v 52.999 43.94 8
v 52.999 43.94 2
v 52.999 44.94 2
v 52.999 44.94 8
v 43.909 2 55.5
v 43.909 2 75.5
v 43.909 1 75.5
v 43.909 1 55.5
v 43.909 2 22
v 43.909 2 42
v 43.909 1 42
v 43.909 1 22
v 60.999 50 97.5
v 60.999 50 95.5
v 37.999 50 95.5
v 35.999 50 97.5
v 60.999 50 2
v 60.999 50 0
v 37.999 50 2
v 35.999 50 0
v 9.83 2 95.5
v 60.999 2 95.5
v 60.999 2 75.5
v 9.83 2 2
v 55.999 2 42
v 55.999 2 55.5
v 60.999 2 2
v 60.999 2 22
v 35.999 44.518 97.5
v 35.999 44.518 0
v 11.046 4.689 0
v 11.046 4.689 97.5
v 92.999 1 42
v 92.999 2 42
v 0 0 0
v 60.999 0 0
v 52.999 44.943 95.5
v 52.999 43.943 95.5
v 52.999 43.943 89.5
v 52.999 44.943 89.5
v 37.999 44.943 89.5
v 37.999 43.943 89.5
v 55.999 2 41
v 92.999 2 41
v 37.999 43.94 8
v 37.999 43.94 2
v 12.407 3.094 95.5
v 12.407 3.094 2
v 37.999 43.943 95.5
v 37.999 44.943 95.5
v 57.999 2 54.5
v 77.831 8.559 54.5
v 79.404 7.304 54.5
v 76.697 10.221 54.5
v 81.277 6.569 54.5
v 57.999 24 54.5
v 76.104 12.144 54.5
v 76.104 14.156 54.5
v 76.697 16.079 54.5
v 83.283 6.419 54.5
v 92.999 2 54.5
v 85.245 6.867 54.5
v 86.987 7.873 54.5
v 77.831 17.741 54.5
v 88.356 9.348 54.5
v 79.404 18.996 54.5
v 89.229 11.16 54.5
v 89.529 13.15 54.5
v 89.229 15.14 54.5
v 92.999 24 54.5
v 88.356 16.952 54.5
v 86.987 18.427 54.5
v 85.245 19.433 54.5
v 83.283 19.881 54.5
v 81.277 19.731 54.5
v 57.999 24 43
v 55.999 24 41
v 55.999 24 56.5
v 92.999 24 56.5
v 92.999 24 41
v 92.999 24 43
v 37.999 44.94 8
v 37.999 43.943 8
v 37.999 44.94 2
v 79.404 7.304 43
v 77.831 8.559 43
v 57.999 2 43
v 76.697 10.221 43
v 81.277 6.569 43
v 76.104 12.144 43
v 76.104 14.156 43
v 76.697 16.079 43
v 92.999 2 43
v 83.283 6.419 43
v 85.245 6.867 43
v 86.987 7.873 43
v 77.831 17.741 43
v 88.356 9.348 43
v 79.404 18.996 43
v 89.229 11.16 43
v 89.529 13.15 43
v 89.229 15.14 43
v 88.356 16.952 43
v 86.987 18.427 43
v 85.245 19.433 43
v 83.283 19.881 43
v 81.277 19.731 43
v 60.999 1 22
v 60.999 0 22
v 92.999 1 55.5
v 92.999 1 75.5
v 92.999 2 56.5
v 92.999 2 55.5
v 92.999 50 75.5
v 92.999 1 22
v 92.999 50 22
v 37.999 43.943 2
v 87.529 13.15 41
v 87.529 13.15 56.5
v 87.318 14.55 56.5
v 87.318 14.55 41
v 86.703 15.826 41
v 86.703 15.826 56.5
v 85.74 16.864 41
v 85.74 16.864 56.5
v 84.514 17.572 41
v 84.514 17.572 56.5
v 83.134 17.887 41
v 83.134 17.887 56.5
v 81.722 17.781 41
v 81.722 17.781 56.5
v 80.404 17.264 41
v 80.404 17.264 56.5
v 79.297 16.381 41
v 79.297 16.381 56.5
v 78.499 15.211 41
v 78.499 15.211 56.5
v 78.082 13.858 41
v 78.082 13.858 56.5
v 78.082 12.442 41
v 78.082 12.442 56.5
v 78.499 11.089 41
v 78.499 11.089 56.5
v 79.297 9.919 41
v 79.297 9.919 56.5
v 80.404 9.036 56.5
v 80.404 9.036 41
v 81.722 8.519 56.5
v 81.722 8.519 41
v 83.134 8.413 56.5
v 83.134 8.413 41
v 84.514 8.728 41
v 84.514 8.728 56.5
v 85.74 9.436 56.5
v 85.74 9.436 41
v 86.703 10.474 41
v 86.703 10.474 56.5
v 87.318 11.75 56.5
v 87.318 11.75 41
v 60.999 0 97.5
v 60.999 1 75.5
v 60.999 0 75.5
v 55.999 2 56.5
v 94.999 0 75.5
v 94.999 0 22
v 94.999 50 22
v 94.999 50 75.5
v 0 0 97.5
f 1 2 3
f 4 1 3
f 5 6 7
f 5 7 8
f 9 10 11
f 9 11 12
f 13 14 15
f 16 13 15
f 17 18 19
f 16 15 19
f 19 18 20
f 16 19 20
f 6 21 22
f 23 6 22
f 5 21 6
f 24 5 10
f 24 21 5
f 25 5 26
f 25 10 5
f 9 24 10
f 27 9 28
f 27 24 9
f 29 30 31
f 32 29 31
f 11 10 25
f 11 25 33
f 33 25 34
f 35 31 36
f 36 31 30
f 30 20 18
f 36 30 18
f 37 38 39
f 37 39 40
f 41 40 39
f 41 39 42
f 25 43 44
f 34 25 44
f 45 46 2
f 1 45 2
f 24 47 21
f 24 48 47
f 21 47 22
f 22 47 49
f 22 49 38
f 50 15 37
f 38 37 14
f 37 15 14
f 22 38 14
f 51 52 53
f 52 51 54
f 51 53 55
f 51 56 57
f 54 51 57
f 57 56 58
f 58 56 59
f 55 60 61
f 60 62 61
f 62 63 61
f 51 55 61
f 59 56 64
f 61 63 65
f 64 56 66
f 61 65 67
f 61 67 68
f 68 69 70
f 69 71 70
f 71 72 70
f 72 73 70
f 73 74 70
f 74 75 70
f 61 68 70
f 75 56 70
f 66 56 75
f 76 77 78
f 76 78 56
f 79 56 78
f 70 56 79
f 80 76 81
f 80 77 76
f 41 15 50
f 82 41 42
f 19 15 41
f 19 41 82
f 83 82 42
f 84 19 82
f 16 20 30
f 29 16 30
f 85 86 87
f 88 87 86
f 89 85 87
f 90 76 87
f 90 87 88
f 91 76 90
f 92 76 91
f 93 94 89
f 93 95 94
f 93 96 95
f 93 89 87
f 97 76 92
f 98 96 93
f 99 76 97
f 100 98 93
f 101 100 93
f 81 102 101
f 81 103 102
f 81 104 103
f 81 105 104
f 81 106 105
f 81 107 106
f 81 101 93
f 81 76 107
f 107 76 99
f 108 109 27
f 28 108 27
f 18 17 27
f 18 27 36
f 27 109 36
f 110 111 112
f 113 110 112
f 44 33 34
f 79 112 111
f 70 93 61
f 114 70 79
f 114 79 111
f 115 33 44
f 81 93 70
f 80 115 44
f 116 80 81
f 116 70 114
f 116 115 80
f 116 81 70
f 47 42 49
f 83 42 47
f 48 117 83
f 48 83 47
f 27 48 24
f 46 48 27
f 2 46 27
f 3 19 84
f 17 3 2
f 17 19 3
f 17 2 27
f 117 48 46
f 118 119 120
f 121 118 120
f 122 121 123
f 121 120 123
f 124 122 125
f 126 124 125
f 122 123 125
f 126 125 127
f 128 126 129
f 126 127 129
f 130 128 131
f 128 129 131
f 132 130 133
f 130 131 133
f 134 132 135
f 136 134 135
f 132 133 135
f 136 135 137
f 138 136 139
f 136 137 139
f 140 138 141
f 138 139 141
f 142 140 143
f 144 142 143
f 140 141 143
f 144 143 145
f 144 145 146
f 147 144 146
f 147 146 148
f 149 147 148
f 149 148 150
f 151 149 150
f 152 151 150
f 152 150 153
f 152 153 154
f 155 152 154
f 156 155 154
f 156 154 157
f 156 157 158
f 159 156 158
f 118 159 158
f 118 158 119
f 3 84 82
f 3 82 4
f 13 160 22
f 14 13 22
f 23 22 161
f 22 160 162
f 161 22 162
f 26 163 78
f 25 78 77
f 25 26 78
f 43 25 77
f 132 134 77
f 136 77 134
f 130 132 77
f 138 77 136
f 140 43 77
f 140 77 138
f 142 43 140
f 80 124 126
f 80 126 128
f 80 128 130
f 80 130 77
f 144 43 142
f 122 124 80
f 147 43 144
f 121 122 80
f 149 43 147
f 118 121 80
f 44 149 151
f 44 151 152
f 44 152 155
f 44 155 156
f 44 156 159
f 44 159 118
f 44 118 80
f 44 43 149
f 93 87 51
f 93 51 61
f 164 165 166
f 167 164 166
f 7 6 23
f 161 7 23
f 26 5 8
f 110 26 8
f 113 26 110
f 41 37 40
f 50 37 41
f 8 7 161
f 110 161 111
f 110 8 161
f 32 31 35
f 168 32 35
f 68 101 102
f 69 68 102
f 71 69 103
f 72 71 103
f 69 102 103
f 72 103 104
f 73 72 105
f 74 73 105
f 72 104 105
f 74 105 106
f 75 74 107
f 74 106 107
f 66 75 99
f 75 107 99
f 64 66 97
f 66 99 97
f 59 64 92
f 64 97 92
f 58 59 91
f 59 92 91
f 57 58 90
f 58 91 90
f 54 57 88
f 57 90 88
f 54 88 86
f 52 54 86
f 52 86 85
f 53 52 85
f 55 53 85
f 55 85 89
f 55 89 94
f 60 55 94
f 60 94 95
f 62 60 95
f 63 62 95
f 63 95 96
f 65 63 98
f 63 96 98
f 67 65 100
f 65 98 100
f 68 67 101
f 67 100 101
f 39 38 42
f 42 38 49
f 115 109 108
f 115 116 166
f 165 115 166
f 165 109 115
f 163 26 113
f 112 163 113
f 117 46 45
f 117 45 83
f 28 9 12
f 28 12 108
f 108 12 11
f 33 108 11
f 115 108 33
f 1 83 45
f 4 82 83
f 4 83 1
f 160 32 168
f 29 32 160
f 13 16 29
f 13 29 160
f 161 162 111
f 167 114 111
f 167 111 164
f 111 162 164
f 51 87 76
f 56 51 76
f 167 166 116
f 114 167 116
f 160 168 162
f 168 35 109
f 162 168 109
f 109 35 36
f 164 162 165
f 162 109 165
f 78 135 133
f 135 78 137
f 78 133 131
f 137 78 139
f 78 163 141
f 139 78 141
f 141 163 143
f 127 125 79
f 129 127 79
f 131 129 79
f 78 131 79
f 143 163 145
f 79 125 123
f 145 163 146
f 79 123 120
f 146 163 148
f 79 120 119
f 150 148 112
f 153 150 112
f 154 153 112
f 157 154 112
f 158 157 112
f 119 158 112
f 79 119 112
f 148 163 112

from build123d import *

# Parameters (mm, degrees)
SALIENTE_EXTRUIR1_DEPTH    = 97.5
VACIADO1_T                 = -2
CORTAR_EXTRUIR1_DEPTH      = 146.020714686
CORTAR_EXTRUIR1_DEPTH_BACK = 146.020714686
CROQUIS2_W                 = 34
CROQUIS2_H                 = 22
CROQUIS5_W                 = 37
CROQUIS5_H                 = 15.5
SALIENTE_EXTRUIR3_DEPTH    = 22
CROQUIS7_R                 = 4.75
CORTAR_EXTRUIR2_DEPTH      = 22
VACIADO2_START             = 43
VACIADO2_OUTLINE_W         = 35
VACIADO2_OUTLINE_H         = 22
VACIADO2_OUTLINE_R         = 6.75
VACIADO2_DEPTH             = 11.5
CROQUIS9_W                 = 49.09
CROQUIS9_H                 = 20
CORTAR_EXTRUIR3_DEPTH      = 1
CROQUIS11_W                = 15
CROQUIS11_H                = 1
SALIENTE_EXTRUIR7_DEPTH    = 6
CROQUIS15_W                = 15
CROQUIS15_H                = 1
SALIENTE_EXTRUIR8_DEPTH    = 6


# Read off the part's stored shape, not the designer's step: Vaciado2
with BuildPart() as part:
    # Croquis1 → Saliente-Extruir1 (new body)
    with BuildSketch(Plane.XY):
        Polygon((0, 0), (94.998724665, 0), (94.998724665, 50), (35.998724665, 50), (35.998724665, 44.517964324), (11.046058241, 4.688773542), align=None)
    extrude(amount=SALIENTE_EXTRUIR1_DEPTH)

    # Vaciado1
    vaciado1_openings = [part.faces().sort_by_distance(p)[0] for p in [
        (65.498724665, 50, 48.75),
    ]]
    offset(amount=VACIADO1_T, openings=vaciado1_openings, kind=Kind.INTERSECTION)

    # Croquis2 → Cortar-Extruir1 (cut, two sides: drawn at the far end of the back side and taken through both)
    with BuildSketch(Plane(origin=(0, 50, 0), x_dir=(1, 0, 0), z_dir=(0, 1, 0)).offset(-CORTAR_EXTRUIR1_DEPTH_BACK)):
        with Locations((77.998724665, -11)):
            Rectangle(CROQUIS2_W, CROQUIS2_H)
        with Locations((77.998724665, -86.5)):
            Rectangle(CROQUIS2_W, CROQUIS2_H)
    extrude(amount=CORTAR_EXTRUIR1_DEPTH + CORTAR_EXTRUIR1_DEPTH_BACK, mode=Mode.SUBTRACT)

    # Croquis5 → Saliente-Extruir3 (add)
    with BuildSketch(Plane(origin=(0, 2, 0), x_dir=(1, 0, 0), z_dir=(0, 1, 0))):
        with Locations((74.498724665, -48.75)):
            Rectangle(CROQUIS5_W, CROQUIS5_H)
    extrude(amount=SALIENTE_EXTRUIR3_DEPTH)

    # Croquis7 → Cortar-Extruir2 (cut)
    with BuildSketch(Plane.XY.offset(56.5)):
        with Locations((82.778724665, 13.15)):
            Circle(CROQUIS7_R)
    extrude(amount=-CORTAR_EXTRUIR2_DEPTH, mode=Mode.SUBTRACT)

    # Vaciado2 outline → Vaciado2 (cut)
    with BuildSketch(Plane.XY.offset(VACIADO2_START)):
        with Locations((75.498724665, 13)):
            Rectangle(VACIADO2_OUTLINE_W, VACIADO2_OUTLINE_H)
        with Locations((82.778724665, 13.15)):
            Circle(VACIADO2_OUTLINE_R, mode=Mode.SUBTRACT)
    extrude(amount=VACIADO2_DEPTH, mode=Mode.SUBTRACT)

    # Croquis9 → Cortar-Extruir3 (cut)
    with BuildSketch(Plane(origin=(0, 2, 0), x_dir=(1, 0, 0), z_dir=(0, 1, 0))):
        with Locations((68.453724665, -32)):
            Rectangle(CROQUIS9_W, CROQUIS9_H)
        with Locations((68.453724665, -65.5)):
            Rectangle(CROQUIS9_W, CROQUIS9_H)
    extrude(amount=-CORTAR_EXTRUIR3_DEPTH, mode=Mode.SUBTRACT)

    # Croquis11 → Saliente-Extruir7 (add)
    with BuildSketch(Plane(origin=(0, 0, 95.5), x_dir=(-1, 0, 0), z_dir=(0, 0, -1))):
        with Locations((-45.498724665, 44.443211382)):
            Rectangle(CROQUIS11_W, CROQUIS11_H)
    extrude(amount=SALIENTE_EXTRUIR7_DEPTH)

    # Croquis15 → Saliente-Extruir8 (add)
    with BuildSketch(Plane.XY.offset(2)):
        with Locations((45.498724665, 44.44)):
            Rectangle(CROQUIS15_W, CROQUIS15_H)
    extrude(amount=SALIENTE_EXTRUIR8_DEPTH)


solid = part.part
